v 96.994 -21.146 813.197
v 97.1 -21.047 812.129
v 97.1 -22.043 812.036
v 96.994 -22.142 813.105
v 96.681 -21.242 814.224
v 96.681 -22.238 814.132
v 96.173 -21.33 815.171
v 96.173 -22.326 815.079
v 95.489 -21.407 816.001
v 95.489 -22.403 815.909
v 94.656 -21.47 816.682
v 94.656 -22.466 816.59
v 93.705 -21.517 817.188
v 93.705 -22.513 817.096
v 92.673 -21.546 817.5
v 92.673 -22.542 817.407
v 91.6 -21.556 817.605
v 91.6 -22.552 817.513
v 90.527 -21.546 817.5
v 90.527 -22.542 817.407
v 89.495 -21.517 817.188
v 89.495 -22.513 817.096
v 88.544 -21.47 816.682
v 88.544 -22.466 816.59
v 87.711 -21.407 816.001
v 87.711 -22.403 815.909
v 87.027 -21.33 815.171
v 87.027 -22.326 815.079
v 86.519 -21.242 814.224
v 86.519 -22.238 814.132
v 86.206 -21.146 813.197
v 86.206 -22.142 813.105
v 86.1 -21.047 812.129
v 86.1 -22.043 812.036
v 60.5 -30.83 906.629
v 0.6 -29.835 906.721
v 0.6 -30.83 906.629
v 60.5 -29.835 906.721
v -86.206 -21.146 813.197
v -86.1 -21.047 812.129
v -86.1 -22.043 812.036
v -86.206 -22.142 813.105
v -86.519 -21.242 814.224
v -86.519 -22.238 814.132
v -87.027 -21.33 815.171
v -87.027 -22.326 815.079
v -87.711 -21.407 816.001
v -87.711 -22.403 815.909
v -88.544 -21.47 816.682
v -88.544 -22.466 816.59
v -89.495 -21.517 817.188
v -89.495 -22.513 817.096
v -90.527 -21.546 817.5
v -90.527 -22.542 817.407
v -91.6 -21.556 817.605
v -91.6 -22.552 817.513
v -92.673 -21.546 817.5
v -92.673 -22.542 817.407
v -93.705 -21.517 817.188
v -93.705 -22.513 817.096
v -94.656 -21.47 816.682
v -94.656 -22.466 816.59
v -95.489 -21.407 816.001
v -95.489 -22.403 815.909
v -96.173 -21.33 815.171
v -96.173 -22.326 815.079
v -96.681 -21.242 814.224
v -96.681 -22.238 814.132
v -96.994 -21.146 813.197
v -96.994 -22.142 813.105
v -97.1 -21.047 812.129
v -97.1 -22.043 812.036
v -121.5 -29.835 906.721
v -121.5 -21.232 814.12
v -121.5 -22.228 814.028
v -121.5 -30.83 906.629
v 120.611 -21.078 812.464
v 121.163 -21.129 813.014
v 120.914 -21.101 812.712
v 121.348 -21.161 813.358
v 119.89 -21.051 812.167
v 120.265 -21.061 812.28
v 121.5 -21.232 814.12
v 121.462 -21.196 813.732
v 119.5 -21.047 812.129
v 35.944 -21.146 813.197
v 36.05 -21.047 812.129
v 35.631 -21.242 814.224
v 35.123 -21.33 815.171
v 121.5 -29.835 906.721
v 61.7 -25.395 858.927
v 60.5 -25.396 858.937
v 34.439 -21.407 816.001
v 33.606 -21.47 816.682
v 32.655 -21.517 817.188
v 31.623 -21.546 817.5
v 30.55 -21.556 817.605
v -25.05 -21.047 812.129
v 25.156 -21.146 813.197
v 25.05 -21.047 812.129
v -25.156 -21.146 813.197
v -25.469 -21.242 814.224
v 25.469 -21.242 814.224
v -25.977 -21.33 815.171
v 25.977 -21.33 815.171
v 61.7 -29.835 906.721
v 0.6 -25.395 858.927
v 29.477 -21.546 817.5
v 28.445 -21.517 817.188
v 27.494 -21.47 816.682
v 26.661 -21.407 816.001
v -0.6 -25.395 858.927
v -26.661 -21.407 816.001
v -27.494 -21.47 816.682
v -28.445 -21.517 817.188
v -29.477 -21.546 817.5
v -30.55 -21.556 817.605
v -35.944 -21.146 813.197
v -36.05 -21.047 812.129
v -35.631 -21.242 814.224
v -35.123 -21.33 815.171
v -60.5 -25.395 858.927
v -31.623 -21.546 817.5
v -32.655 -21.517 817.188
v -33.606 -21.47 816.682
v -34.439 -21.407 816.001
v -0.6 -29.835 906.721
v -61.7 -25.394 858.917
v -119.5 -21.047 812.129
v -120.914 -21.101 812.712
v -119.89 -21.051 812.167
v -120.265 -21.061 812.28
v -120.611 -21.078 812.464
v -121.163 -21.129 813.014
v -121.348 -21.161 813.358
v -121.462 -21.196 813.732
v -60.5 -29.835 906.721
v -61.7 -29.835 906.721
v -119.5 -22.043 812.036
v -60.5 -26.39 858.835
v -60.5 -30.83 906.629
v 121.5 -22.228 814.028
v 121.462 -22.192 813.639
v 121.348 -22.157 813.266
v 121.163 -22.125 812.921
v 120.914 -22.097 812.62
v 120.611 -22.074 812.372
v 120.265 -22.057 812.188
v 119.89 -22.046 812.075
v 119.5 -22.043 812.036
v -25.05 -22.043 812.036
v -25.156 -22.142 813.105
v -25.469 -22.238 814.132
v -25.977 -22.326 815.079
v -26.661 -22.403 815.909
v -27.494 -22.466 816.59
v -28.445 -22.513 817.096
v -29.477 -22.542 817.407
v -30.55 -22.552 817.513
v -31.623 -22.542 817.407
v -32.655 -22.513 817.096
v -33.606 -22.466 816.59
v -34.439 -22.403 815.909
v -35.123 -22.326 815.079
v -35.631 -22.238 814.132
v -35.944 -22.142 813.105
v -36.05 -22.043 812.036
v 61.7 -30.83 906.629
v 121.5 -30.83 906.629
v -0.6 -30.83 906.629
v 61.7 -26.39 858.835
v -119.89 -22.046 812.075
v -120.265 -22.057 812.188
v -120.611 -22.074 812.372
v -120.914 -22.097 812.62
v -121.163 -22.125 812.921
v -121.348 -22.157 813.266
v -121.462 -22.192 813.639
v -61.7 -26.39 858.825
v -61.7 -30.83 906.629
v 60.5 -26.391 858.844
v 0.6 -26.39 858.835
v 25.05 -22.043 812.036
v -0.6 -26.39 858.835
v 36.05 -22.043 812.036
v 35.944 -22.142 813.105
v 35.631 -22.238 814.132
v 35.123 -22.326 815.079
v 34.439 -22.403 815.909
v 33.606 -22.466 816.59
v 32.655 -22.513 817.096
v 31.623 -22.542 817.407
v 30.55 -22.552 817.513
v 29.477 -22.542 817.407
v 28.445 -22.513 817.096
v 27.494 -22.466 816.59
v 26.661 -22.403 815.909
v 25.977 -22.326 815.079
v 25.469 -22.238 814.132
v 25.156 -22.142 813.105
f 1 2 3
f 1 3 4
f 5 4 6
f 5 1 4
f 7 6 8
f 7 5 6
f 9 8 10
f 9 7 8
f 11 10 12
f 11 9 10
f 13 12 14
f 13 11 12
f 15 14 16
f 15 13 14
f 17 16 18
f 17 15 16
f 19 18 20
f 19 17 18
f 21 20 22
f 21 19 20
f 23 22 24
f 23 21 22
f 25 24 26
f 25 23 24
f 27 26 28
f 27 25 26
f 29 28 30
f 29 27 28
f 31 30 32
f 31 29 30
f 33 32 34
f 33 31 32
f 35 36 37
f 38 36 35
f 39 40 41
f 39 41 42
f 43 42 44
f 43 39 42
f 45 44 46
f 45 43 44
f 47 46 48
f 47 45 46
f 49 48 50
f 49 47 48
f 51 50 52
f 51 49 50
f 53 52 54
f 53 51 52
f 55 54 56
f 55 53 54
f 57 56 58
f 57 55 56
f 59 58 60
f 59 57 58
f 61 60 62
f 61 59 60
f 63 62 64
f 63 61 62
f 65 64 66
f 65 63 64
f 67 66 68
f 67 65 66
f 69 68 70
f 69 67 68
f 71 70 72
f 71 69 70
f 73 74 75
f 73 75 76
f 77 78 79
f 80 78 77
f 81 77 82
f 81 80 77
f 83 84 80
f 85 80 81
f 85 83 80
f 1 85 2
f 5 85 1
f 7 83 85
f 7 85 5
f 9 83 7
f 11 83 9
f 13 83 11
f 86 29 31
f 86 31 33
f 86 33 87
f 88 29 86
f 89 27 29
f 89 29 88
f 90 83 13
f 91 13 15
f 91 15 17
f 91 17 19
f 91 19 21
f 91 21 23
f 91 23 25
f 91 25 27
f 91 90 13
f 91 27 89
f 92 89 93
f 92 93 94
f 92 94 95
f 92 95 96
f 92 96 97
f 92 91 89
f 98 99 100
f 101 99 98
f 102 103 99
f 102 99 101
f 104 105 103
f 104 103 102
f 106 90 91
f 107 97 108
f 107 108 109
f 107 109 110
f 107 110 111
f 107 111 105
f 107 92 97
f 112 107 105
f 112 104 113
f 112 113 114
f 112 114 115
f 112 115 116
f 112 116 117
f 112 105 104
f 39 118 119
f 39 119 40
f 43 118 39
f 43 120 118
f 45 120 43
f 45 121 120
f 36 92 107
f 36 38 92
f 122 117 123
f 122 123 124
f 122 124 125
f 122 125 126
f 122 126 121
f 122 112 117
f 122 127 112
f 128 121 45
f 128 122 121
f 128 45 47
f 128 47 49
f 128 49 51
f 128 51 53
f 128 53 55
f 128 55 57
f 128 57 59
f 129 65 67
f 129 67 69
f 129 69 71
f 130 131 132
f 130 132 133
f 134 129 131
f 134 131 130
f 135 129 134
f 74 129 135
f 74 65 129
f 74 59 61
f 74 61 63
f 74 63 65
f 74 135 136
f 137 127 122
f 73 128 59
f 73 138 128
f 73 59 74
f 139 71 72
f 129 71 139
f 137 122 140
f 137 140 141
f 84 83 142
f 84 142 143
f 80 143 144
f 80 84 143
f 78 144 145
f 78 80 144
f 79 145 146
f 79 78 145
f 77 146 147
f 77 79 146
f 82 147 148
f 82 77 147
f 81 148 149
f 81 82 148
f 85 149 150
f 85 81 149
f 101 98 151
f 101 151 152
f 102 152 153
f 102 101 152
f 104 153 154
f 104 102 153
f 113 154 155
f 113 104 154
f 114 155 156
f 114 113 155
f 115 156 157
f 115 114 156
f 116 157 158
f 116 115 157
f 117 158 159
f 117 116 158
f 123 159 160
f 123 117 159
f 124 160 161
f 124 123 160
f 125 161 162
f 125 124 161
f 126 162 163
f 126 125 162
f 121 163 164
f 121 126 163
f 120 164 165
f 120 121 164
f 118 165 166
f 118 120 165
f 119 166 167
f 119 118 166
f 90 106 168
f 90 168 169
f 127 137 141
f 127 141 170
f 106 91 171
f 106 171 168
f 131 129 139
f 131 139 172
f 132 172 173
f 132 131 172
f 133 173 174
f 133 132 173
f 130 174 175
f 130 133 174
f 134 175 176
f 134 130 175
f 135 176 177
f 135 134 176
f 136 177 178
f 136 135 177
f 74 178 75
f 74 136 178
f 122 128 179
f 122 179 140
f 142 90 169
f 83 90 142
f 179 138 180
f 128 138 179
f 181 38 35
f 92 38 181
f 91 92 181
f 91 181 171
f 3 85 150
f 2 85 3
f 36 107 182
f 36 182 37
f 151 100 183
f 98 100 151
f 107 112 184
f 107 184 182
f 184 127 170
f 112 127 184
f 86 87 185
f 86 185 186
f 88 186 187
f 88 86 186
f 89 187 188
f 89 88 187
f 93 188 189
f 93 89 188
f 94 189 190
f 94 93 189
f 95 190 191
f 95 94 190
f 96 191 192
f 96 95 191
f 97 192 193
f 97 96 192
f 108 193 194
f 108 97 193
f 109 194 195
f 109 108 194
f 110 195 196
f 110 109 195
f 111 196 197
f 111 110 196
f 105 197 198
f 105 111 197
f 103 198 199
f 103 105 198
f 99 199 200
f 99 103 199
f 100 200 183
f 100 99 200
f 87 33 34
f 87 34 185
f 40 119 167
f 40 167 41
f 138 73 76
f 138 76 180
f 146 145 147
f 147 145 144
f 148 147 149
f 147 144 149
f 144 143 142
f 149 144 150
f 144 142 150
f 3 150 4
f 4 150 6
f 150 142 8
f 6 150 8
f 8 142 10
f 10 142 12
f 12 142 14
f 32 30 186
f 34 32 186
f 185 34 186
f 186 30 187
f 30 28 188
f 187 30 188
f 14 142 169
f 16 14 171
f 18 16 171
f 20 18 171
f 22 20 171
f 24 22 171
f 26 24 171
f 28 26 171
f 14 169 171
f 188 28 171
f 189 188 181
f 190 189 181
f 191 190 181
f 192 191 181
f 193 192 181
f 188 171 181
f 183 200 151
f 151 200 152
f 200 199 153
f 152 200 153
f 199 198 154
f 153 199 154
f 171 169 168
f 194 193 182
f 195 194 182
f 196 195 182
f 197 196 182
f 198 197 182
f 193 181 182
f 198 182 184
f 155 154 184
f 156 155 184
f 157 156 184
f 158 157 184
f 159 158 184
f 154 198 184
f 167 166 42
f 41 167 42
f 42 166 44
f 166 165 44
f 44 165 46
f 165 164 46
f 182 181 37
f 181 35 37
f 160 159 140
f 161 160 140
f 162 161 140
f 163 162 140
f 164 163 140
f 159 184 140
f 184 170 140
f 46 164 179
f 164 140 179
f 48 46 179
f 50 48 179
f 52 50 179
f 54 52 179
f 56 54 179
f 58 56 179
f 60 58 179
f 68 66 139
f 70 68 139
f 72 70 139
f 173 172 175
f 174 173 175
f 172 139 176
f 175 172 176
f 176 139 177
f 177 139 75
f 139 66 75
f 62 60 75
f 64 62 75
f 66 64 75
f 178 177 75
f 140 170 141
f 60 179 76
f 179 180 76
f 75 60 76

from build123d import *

# Parameters (mm, degrees)
EXTRUDE_1_DEPTH = 1


with BuildPart() as part:
    # 草图1 → 凸台-拉伸1 (new body)
    with BuildSketch(Plane(origin=(0, 53.933062278, 5.010311528), x_dir=(-1, 0, 0), z_dir=(5.133494296529154e-15, 0.9957126460708378, 0.09250041326724258))):
        with BuildLine():
            Line((-121.5, 905.593751703), (-121.5, 812.593751703))
            ThreePointArc((-121.5, 812.593751703), (-120.914213563, 811.179538141), (-119.5, 810.593751703))
            Line((-119.5, 810.593751703), (-97.1, 810.593751703))
            ThreePointArc((-97.1, 810.593751703), (-91.6, 816.093751703), (-86.1, 810.593751703))
            Line((-86.1, 810.593751703), (-36.05, 810.593751703))
            ThreePointArc((-36.05, 810.593751703), (-30.55, 816.093751703), (-25.05, 810.593751703))
            Line((-25.05, 810.593751703), (25.05, 810.593751703))
            ThreePointArc((25.05, 810.593751703), (30.55, 816.093751703), (36.05, 810.593751703))
            Line((36.05, 810.593751703), (86.1, 810.593751703))
            ThreePointArc((86.1, 810.593751703), (91.6, 816.093751703), (97.1, 810.593751703))
            Line((97.1, 810.593751703), (119.5, 810.593751703))
            ThreePointArc((119.5, 810.593751703), (120.914213562, 811.179538141), (121.5, 812.593751703))
            Line((121.5, 812.593751703), (121.5, 905.593751703))
            Line((121.5, 905.593751703), (61.7, 905.593751703))
            Line((61.7, 905.593751703), (61.7, 857.583834348))
            Line((61.7, 857.583834348), (60.5, 857.593751703))
            Line((60.5, 857.593751703), (60.5, 905.593751703))
            Line((60.5, 905.593751703), (0.6, 905.593751703))
            Line((0.6, 905.593751703), (0.6, 857.593751703))
            Line((0.6, 857.593751703), (-0.6, 857.593751703))
            Line((-0.6, 857.593751703), (-0.6, 905.593751703))
            Line((-0.6, 905.593751703), (-60.5, 905.593751703))
            Line((-60.5, 905.593751703), (-60.5, 857.603476177))
            Line((-60.5, 857.603476177), (-61.7, 857.593751703))
            Line((-61.7, 857.593751703), (-61.7, 905.593751703))
            Line((-61.7, 905.593751703), (-121.5, 905.593751703))
        make_face()
    extrude(amount=-EXTRUDE_1_DEPTH)


solid = part.part
